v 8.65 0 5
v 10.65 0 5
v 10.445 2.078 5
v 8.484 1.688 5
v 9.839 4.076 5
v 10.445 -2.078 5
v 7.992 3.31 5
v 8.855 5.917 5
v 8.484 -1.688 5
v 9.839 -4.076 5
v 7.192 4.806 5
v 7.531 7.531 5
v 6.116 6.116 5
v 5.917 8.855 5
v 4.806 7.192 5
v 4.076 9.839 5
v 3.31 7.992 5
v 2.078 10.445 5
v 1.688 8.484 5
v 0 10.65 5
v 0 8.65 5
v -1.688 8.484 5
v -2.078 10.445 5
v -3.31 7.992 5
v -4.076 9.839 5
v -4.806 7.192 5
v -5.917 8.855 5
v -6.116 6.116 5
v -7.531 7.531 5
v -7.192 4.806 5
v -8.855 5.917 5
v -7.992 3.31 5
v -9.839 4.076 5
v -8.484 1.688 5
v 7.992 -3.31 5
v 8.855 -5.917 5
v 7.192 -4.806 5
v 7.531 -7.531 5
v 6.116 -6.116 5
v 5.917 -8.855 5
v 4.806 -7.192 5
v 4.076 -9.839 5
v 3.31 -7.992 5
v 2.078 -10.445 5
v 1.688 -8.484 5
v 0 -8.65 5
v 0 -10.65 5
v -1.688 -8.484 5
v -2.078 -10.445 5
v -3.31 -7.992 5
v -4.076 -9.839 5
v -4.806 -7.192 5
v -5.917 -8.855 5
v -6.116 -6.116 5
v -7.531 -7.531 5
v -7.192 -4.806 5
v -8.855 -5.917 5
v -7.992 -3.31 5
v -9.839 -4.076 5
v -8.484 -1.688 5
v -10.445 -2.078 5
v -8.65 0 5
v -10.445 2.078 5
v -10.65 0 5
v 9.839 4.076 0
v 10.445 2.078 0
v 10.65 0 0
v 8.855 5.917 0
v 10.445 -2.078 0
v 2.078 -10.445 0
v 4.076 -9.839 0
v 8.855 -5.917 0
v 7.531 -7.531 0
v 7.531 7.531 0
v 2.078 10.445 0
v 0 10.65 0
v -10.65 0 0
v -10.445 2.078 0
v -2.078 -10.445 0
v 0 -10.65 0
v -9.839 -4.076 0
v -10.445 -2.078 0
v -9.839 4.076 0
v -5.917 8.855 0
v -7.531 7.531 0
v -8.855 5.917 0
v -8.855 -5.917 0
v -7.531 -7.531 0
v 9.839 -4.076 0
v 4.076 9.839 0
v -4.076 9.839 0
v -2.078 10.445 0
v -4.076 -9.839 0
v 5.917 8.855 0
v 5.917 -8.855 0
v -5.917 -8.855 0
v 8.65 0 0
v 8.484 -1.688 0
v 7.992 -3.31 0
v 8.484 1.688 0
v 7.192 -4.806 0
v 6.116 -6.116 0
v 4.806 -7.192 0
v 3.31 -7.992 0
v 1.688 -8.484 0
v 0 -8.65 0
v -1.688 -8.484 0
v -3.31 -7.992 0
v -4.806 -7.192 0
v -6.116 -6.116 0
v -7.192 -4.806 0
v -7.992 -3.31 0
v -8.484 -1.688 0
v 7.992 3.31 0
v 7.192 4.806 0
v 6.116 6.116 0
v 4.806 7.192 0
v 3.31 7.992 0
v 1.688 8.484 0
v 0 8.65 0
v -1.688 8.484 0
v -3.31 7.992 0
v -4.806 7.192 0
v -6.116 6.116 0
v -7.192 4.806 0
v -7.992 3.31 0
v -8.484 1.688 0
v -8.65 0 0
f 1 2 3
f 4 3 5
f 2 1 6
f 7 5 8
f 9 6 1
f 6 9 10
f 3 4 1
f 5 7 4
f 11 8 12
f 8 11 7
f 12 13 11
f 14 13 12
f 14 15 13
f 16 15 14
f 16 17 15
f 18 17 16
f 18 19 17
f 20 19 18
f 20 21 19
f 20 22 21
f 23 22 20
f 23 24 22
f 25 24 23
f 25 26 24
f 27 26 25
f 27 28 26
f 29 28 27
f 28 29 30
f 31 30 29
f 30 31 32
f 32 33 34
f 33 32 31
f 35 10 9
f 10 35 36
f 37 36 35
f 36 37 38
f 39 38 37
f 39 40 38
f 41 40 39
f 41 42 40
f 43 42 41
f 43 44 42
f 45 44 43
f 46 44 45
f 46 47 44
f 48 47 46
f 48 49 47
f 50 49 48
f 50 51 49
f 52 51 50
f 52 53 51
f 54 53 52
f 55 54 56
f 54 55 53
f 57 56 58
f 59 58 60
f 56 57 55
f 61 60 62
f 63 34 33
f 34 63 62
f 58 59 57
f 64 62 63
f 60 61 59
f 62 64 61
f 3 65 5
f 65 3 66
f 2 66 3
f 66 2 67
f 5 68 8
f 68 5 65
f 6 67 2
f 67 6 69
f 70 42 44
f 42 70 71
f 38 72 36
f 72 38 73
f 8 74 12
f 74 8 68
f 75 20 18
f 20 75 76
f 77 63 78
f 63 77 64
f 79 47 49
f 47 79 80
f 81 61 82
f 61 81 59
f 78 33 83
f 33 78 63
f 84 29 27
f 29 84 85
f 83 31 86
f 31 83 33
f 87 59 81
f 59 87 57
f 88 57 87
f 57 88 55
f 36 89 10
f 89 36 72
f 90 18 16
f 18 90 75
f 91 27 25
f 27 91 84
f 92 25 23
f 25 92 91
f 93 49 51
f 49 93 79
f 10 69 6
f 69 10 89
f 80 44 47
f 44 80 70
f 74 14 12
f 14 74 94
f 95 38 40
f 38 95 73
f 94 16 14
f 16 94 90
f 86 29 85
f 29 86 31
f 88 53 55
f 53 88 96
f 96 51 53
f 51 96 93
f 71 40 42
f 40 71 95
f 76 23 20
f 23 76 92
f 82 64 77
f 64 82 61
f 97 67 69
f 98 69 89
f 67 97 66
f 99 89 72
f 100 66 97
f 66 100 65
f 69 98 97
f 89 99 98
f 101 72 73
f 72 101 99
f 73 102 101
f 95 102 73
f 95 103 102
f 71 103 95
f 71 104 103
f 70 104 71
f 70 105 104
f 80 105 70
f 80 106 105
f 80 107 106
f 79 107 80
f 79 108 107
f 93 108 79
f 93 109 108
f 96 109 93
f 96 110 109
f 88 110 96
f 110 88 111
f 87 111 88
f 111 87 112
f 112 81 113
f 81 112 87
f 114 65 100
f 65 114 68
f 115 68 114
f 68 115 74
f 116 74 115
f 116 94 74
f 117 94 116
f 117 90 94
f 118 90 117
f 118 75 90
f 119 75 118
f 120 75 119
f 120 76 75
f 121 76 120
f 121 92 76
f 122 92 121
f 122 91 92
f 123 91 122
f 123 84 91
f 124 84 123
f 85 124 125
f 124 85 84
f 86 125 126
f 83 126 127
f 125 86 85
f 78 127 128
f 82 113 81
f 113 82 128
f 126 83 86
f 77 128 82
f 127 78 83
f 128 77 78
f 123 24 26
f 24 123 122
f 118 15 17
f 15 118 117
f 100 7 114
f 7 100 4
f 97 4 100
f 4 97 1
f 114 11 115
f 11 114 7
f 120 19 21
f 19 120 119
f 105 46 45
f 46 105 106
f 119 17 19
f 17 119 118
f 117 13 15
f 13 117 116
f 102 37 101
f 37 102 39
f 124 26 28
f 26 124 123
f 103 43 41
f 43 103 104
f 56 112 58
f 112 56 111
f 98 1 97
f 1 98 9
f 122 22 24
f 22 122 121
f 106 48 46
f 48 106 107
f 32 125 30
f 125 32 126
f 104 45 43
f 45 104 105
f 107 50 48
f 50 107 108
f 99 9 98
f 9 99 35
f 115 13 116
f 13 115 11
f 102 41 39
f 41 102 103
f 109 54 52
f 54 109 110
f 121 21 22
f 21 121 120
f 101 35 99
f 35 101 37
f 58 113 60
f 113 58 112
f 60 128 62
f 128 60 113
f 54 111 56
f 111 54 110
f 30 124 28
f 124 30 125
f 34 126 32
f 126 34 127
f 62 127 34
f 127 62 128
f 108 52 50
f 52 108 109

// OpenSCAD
$fn = 32;

// ----------------------------------------------------------------------
// Spacer sleeve: 21.3 / 17.3 x 5 mm
// ----------------------------------------------------------------------

// --- parameters (mm) ---
sleeve_od = 21.3;         // outside diameter
sleeve_id = 17.3;         // shaft bore
sleeve_l = 5;             // sleeve length
step_d = 20.5;            // reduced diameter
step_l = 2.05;            // length of the step

module sleeve() {
  cylinder(h = sleeve_l, d = sleeve_od);
  translate([0, 0, sleeve_l - step_l]) cylinder(h = step_l, d = step_d);
}

difference() {
  sleeve();
  translate([0, 0, -1]) cylinder(h = sleeve_l + 2, d = sleeve_id);
}
